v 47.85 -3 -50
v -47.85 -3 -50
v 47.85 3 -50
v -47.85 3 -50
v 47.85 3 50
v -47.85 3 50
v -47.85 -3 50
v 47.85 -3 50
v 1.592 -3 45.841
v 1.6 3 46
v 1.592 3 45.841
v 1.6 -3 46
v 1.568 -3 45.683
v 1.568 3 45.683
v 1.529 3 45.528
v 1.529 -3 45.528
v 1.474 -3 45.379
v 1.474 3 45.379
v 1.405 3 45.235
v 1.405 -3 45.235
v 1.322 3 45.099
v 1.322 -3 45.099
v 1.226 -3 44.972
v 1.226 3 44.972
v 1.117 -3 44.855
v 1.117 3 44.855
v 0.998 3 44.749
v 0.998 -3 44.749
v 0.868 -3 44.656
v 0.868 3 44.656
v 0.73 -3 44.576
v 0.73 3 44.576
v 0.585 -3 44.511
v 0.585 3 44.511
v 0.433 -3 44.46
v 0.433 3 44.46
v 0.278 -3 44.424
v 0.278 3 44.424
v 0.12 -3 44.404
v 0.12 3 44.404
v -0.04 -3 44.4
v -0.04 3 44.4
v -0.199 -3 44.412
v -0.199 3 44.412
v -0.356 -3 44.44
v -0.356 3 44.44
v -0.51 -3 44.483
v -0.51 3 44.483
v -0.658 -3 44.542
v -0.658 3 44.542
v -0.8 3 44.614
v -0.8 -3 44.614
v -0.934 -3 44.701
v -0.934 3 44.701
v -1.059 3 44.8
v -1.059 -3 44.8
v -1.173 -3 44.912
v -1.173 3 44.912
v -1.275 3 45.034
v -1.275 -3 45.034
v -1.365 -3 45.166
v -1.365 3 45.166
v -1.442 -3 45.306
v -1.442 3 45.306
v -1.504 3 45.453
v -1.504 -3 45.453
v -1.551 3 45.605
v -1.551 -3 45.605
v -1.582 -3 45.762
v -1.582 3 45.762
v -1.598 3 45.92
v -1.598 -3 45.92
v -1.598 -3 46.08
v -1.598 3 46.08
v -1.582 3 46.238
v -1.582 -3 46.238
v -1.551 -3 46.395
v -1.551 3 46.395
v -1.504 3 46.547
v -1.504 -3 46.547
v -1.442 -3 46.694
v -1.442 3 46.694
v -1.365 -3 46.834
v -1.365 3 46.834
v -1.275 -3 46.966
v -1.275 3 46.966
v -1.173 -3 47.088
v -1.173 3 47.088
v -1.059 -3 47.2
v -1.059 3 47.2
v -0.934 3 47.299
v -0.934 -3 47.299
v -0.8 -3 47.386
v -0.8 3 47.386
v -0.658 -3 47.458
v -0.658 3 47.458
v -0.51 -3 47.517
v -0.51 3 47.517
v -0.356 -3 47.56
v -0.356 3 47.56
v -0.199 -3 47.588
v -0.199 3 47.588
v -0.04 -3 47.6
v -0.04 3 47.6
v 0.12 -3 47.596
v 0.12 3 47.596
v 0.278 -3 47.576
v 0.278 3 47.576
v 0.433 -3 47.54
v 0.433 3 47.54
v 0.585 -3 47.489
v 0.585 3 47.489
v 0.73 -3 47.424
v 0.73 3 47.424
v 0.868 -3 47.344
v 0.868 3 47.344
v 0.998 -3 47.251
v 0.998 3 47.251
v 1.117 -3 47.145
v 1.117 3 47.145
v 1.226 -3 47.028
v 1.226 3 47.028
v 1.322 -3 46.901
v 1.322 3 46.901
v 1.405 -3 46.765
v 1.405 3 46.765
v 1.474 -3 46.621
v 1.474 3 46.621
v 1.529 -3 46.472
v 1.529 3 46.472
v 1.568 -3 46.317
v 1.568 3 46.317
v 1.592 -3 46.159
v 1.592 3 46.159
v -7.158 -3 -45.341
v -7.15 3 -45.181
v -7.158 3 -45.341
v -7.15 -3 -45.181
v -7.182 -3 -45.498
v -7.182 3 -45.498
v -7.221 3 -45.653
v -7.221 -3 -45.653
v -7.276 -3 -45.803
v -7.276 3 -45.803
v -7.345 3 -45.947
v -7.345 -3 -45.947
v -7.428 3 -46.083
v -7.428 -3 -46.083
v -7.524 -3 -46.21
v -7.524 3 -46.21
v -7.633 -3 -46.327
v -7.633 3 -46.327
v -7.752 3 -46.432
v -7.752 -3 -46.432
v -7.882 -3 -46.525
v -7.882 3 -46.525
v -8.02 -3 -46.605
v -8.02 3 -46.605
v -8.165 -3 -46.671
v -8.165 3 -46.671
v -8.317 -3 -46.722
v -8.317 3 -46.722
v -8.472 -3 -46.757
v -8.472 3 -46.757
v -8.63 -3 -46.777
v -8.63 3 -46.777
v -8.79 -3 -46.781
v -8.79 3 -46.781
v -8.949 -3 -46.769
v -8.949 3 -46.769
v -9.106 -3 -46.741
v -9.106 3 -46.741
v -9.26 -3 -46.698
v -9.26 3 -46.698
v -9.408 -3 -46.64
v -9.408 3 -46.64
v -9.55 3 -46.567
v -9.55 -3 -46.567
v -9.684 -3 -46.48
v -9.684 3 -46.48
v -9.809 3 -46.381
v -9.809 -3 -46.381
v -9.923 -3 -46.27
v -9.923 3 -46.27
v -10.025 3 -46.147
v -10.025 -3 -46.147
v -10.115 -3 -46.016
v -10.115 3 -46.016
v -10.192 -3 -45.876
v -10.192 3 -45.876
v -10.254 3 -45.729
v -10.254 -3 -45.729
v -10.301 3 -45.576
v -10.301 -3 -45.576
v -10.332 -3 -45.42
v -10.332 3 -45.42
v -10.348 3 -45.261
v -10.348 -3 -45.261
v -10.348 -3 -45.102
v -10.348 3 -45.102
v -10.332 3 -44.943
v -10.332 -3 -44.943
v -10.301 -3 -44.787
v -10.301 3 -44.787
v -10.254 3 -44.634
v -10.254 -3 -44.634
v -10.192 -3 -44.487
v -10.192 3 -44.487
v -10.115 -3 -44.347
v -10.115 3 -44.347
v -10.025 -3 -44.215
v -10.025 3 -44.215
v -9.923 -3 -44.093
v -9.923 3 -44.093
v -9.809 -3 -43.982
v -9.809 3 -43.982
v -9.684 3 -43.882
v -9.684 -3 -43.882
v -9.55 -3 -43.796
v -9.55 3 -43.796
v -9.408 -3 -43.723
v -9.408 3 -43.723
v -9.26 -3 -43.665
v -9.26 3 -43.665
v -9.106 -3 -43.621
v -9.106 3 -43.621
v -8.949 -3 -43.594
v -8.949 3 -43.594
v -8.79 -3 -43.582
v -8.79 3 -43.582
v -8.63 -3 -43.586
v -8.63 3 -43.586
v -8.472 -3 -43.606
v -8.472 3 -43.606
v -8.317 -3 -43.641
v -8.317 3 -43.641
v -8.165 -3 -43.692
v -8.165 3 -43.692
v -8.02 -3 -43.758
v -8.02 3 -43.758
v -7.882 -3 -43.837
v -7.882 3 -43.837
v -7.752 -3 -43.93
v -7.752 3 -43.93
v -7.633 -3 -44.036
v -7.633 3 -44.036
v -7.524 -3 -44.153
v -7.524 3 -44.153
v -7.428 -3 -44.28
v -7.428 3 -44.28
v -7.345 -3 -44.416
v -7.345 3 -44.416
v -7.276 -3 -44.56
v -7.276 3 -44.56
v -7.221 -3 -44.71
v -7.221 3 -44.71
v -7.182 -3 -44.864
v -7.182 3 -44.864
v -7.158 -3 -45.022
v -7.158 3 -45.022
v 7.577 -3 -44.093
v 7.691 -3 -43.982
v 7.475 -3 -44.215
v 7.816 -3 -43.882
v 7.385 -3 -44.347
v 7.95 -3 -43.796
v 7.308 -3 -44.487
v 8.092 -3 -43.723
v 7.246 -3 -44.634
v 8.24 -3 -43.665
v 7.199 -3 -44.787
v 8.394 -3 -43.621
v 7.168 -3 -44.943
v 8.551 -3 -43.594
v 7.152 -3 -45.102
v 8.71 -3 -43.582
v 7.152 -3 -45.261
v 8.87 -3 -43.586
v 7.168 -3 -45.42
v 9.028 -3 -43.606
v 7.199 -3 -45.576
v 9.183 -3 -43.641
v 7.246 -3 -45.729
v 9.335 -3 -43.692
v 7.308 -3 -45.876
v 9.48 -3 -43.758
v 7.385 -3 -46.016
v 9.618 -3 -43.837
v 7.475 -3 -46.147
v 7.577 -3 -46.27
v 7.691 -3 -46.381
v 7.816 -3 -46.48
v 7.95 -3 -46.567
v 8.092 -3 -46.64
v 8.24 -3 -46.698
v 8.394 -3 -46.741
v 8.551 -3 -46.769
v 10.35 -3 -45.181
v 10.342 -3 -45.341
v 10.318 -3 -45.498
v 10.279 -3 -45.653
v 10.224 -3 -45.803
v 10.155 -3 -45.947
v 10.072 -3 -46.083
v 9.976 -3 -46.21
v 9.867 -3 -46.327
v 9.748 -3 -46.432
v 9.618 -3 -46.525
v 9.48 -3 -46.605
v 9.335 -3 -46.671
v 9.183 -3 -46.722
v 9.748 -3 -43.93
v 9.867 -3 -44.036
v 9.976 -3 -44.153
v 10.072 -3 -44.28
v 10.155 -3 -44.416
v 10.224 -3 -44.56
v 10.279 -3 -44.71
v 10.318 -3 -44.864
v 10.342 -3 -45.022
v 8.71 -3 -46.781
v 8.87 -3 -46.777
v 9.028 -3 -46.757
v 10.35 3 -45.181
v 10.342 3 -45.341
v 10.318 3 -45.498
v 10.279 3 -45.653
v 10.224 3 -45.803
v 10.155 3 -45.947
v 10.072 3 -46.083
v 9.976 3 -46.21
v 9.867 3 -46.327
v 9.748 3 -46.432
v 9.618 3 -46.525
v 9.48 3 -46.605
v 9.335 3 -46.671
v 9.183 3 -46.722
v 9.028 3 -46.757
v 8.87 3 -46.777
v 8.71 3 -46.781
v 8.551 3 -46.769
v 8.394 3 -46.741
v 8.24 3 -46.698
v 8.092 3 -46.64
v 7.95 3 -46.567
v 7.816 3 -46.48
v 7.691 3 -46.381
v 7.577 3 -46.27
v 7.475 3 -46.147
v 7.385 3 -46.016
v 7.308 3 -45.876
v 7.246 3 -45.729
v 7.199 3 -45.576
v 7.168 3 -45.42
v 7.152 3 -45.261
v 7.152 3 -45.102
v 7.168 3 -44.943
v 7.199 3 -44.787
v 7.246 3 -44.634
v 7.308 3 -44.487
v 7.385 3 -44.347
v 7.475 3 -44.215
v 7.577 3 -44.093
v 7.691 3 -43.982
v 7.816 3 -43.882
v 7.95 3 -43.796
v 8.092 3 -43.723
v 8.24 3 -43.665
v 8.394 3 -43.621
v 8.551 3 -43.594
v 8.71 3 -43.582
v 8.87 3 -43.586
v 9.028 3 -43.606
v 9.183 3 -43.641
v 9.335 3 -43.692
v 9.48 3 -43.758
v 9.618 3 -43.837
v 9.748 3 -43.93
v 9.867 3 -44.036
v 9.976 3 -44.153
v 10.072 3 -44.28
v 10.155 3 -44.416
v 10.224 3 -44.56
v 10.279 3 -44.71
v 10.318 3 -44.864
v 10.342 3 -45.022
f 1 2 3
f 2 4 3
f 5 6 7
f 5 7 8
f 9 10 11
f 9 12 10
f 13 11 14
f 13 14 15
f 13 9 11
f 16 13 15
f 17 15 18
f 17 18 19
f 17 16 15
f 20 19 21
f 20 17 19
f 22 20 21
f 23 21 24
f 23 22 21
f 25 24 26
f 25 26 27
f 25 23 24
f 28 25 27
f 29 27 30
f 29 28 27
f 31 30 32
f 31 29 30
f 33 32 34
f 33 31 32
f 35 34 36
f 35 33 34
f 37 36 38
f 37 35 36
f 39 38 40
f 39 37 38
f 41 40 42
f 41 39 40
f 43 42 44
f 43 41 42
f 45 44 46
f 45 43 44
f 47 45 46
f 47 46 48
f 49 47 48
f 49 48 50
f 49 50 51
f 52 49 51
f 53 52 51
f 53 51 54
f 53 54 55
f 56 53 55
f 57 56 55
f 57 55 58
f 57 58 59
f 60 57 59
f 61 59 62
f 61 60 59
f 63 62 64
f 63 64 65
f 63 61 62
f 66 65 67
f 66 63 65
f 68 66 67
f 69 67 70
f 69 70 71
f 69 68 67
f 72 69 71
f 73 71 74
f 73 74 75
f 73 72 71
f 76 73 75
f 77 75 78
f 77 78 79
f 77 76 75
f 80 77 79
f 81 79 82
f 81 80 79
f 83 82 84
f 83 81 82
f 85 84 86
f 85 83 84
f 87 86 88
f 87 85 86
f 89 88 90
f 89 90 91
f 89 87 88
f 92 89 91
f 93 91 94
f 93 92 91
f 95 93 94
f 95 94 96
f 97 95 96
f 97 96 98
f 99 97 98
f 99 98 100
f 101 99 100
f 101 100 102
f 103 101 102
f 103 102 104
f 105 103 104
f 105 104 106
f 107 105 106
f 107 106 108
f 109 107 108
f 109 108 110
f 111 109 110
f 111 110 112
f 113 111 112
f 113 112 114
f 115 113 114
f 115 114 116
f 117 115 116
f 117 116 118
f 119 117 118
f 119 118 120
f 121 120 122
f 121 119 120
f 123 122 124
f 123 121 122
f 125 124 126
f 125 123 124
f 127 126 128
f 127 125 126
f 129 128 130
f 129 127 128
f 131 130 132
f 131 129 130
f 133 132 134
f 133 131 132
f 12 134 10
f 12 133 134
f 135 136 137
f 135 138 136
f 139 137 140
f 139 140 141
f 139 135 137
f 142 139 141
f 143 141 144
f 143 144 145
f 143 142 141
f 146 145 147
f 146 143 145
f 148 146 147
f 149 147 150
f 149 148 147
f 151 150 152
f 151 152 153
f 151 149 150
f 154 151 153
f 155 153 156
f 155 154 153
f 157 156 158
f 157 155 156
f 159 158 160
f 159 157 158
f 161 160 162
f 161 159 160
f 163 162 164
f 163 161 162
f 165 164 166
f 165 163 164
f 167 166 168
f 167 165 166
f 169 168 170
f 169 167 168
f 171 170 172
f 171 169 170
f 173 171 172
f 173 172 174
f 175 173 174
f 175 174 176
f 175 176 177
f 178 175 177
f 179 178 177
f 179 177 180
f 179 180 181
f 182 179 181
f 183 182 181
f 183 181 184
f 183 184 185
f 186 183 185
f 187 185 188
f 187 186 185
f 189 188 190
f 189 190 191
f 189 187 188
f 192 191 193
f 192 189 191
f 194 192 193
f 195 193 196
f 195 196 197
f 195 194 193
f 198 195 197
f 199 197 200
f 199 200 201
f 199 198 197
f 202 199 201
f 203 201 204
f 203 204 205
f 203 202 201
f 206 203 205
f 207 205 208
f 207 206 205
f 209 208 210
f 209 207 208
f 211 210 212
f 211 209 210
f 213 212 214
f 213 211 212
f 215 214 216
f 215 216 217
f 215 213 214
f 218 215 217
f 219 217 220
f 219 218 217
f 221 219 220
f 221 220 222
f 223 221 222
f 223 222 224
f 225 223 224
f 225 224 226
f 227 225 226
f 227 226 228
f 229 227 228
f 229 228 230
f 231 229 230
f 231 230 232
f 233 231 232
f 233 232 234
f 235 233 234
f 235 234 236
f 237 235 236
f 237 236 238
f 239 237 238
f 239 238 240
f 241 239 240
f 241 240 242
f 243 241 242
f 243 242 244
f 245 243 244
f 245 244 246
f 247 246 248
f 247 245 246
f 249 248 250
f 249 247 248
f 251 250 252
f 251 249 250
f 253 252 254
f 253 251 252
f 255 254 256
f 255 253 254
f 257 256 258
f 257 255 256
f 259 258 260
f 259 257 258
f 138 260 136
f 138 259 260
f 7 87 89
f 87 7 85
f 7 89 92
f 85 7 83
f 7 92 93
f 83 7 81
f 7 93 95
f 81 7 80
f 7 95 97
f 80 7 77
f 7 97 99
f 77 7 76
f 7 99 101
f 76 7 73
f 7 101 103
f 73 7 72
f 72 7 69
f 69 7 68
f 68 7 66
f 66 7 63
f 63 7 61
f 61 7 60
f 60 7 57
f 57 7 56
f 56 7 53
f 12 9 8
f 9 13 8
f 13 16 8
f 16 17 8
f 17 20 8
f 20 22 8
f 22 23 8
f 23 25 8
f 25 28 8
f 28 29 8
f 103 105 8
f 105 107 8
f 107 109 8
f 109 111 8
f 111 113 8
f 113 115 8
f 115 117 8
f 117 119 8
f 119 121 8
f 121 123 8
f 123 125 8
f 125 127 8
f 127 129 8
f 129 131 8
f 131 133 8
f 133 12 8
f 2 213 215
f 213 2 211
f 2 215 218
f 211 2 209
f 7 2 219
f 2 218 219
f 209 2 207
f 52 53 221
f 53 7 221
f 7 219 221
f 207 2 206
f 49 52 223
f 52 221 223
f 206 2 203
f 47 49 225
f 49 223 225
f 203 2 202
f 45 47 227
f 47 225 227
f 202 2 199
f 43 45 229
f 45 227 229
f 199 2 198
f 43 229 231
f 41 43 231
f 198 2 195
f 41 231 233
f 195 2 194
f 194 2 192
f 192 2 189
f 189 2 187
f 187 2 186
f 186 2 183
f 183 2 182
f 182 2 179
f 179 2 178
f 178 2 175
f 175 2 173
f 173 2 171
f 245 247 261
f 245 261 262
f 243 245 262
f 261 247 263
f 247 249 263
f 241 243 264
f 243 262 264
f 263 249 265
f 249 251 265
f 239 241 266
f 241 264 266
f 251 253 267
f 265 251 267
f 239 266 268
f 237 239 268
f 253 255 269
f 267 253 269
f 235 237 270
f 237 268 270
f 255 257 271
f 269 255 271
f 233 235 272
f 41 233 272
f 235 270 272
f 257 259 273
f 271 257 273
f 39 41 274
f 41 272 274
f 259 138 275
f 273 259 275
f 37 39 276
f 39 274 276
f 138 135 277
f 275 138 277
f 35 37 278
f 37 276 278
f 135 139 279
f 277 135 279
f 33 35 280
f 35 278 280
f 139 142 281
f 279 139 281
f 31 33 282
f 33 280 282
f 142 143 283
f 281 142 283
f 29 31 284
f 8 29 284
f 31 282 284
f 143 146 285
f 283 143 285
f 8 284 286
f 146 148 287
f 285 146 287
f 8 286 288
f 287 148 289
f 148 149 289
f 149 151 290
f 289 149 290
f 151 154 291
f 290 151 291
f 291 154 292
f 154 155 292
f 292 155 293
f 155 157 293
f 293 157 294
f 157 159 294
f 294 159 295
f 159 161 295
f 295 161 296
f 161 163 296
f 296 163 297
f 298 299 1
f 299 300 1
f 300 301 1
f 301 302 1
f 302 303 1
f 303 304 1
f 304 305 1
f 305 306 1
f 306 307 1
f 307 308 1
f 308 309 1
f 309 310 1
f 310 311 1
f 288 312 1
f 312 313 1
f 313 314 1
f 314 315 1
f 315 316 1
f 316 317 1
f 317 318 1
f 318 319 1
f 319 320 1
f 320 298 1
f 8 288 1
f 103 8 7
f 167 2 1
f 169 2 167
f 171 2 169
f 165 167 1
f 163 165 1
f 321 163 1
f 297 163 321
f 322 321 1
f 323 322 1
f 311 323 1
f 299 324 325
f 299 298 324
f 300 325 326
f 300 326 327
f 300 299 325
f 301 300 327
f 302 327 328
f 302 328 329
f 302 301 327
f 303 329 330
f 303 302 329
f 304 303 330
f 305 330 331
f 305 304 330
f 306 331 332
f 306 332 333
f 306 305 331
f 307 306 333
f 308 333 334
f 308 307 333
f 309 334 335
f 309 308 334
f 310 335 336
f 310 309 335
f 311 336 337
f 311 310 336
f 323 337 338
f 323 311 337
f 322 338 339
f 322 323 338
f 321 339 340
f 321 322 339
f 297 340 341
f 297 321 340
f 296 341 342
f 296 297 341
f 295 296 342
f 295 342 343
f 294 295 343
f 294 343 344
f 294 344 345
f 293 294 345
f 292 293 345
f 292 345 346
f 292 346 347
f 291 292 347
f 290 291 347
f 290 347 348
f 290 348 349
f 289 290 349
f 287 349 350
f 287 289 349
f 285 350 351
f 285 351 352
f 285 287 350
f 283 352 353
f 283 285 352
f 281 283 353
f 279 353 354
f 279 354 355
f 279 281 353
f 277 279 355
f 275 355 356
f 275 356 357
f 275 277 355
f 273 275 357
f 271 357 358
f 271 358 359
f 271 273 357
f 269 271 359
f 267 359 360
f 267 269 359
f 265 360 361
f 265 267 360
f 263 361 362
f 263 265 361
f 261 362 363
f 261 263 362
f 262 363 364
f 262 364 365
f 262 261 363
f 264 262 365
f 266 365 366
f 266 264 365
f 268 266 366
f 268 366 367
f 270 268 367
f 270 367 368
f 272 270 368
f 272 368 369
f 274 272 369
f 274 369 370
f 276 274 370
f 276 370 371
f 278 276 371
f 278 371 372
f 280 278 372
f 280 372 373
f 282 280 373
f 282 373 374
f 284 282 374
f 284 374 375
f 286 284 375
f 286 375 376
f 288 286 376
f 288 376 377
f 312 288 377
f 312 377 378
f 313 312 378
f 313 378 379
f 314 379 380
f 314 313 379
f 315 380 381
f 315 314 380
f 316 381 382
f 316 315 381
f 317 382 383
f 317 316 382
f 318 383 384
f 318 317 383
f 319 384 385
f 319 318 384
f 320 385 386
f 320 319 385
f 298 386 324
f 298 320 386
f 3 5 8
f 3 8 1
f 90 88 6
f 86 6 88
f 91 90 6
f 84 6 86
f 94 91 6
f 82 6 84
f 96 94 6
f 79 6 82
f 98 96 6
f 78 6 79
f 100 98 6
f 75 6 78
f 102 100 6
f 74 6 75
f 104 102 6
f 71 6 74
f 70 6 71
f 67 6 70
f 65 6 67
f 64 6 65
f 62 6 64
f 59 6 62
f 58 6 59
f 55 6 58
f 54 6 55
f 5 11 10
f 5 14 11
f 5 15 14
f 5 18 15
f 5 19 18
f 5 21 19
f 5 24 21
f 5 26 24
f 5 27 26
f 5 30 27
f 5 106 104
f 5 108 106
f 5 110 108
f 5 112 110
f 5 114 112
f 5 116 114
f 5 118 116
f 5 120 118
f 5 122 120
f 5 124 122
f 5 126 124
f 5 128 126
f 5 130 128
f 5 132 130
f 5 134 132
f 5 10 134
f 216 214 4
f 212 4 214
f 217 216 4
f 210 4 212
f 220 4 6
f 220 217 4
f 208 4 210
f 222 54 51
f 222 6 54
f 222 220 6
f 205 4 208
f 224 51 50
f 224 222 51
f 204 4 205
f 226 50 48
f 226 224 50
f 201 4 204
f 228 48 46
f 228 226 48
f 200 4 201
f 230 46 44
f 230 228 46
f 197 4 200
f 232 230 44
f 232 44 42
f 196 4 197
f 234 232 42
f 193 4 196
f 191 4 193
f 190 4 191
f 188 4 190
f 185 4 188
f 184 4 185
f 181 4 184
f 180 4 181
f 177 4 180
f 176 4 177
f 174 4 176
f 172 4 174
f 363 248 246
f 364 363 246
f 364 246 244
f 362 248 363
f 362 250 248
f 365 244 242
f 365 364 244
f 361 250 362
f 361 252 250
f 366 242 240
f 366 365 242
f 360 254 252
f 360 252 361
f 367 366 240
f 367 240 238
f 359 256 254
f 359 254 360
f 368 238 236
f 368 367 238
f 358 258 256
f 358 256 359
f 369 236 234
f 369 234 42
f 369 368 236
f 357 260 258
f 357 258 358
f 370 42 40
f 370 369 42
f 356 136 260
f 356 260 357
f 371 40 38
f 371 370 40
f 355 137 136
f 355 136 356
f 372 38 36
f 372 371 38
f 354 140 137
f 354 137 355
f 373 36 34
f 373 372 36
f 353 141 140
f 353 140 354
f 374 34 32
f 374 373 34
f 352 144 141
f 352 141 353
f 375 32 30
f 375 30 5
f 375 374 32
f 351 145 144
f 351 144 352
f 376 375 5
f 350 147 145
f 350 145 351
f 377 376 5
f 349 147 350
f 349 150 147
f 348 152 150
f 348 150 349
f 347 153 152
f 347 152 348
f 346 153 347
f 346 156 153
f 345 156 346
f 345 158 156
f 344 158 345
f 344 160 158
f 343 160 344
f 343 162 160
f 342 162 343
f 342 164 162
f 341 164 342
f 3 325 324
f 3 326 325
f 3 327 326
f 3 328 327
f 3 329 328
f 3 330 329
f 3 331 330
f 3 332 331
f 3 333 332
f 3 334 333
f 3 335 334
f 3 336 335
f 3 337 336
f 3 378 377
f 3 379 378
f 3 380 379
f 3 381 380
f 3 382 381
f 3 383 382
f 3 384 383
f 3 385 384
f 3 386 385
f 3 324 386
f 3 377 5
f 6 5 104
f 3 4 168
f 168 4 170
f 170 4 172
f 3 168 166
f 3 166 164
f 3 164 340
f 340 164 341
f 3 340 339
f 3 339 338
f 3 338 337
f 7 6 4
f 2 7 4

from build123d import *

# Parameters (mm, degrees)
SKETCH1_W           = 95.7
SKETCH1_H           = 100
SKETCH1_R           = 1.6
BOSS_EXTRUDE1_DEPTH = 3


with BuildPart() as part:
    # Sketch1 → Boss-Extrude1 (new body, symmetric)
    with BuildSketch(Plane(origin=(0, 0, 0), x_dir=(1, 0, 0), z_dir=(0, 1, 0))):
        Rectangle(SKETCH1_W, SKETCH1_H)
        with Locations((-8.75, 45.181367204)):
            Circle(SKETCH1_R, mode=Mode.SUBTRACT)
        with Locations((8.75, 45.181367204)):
            Circle(SKETCH1_R, mode=Mode.SUBTRACT)
        with Locations((0, -46)):
            Circle(SKETCH1_R, mode=Mode.SUBTRACT)
    extrude(amount=BOSS_EXTRUDE1_DEPTH, both=True)


solid = part.part
